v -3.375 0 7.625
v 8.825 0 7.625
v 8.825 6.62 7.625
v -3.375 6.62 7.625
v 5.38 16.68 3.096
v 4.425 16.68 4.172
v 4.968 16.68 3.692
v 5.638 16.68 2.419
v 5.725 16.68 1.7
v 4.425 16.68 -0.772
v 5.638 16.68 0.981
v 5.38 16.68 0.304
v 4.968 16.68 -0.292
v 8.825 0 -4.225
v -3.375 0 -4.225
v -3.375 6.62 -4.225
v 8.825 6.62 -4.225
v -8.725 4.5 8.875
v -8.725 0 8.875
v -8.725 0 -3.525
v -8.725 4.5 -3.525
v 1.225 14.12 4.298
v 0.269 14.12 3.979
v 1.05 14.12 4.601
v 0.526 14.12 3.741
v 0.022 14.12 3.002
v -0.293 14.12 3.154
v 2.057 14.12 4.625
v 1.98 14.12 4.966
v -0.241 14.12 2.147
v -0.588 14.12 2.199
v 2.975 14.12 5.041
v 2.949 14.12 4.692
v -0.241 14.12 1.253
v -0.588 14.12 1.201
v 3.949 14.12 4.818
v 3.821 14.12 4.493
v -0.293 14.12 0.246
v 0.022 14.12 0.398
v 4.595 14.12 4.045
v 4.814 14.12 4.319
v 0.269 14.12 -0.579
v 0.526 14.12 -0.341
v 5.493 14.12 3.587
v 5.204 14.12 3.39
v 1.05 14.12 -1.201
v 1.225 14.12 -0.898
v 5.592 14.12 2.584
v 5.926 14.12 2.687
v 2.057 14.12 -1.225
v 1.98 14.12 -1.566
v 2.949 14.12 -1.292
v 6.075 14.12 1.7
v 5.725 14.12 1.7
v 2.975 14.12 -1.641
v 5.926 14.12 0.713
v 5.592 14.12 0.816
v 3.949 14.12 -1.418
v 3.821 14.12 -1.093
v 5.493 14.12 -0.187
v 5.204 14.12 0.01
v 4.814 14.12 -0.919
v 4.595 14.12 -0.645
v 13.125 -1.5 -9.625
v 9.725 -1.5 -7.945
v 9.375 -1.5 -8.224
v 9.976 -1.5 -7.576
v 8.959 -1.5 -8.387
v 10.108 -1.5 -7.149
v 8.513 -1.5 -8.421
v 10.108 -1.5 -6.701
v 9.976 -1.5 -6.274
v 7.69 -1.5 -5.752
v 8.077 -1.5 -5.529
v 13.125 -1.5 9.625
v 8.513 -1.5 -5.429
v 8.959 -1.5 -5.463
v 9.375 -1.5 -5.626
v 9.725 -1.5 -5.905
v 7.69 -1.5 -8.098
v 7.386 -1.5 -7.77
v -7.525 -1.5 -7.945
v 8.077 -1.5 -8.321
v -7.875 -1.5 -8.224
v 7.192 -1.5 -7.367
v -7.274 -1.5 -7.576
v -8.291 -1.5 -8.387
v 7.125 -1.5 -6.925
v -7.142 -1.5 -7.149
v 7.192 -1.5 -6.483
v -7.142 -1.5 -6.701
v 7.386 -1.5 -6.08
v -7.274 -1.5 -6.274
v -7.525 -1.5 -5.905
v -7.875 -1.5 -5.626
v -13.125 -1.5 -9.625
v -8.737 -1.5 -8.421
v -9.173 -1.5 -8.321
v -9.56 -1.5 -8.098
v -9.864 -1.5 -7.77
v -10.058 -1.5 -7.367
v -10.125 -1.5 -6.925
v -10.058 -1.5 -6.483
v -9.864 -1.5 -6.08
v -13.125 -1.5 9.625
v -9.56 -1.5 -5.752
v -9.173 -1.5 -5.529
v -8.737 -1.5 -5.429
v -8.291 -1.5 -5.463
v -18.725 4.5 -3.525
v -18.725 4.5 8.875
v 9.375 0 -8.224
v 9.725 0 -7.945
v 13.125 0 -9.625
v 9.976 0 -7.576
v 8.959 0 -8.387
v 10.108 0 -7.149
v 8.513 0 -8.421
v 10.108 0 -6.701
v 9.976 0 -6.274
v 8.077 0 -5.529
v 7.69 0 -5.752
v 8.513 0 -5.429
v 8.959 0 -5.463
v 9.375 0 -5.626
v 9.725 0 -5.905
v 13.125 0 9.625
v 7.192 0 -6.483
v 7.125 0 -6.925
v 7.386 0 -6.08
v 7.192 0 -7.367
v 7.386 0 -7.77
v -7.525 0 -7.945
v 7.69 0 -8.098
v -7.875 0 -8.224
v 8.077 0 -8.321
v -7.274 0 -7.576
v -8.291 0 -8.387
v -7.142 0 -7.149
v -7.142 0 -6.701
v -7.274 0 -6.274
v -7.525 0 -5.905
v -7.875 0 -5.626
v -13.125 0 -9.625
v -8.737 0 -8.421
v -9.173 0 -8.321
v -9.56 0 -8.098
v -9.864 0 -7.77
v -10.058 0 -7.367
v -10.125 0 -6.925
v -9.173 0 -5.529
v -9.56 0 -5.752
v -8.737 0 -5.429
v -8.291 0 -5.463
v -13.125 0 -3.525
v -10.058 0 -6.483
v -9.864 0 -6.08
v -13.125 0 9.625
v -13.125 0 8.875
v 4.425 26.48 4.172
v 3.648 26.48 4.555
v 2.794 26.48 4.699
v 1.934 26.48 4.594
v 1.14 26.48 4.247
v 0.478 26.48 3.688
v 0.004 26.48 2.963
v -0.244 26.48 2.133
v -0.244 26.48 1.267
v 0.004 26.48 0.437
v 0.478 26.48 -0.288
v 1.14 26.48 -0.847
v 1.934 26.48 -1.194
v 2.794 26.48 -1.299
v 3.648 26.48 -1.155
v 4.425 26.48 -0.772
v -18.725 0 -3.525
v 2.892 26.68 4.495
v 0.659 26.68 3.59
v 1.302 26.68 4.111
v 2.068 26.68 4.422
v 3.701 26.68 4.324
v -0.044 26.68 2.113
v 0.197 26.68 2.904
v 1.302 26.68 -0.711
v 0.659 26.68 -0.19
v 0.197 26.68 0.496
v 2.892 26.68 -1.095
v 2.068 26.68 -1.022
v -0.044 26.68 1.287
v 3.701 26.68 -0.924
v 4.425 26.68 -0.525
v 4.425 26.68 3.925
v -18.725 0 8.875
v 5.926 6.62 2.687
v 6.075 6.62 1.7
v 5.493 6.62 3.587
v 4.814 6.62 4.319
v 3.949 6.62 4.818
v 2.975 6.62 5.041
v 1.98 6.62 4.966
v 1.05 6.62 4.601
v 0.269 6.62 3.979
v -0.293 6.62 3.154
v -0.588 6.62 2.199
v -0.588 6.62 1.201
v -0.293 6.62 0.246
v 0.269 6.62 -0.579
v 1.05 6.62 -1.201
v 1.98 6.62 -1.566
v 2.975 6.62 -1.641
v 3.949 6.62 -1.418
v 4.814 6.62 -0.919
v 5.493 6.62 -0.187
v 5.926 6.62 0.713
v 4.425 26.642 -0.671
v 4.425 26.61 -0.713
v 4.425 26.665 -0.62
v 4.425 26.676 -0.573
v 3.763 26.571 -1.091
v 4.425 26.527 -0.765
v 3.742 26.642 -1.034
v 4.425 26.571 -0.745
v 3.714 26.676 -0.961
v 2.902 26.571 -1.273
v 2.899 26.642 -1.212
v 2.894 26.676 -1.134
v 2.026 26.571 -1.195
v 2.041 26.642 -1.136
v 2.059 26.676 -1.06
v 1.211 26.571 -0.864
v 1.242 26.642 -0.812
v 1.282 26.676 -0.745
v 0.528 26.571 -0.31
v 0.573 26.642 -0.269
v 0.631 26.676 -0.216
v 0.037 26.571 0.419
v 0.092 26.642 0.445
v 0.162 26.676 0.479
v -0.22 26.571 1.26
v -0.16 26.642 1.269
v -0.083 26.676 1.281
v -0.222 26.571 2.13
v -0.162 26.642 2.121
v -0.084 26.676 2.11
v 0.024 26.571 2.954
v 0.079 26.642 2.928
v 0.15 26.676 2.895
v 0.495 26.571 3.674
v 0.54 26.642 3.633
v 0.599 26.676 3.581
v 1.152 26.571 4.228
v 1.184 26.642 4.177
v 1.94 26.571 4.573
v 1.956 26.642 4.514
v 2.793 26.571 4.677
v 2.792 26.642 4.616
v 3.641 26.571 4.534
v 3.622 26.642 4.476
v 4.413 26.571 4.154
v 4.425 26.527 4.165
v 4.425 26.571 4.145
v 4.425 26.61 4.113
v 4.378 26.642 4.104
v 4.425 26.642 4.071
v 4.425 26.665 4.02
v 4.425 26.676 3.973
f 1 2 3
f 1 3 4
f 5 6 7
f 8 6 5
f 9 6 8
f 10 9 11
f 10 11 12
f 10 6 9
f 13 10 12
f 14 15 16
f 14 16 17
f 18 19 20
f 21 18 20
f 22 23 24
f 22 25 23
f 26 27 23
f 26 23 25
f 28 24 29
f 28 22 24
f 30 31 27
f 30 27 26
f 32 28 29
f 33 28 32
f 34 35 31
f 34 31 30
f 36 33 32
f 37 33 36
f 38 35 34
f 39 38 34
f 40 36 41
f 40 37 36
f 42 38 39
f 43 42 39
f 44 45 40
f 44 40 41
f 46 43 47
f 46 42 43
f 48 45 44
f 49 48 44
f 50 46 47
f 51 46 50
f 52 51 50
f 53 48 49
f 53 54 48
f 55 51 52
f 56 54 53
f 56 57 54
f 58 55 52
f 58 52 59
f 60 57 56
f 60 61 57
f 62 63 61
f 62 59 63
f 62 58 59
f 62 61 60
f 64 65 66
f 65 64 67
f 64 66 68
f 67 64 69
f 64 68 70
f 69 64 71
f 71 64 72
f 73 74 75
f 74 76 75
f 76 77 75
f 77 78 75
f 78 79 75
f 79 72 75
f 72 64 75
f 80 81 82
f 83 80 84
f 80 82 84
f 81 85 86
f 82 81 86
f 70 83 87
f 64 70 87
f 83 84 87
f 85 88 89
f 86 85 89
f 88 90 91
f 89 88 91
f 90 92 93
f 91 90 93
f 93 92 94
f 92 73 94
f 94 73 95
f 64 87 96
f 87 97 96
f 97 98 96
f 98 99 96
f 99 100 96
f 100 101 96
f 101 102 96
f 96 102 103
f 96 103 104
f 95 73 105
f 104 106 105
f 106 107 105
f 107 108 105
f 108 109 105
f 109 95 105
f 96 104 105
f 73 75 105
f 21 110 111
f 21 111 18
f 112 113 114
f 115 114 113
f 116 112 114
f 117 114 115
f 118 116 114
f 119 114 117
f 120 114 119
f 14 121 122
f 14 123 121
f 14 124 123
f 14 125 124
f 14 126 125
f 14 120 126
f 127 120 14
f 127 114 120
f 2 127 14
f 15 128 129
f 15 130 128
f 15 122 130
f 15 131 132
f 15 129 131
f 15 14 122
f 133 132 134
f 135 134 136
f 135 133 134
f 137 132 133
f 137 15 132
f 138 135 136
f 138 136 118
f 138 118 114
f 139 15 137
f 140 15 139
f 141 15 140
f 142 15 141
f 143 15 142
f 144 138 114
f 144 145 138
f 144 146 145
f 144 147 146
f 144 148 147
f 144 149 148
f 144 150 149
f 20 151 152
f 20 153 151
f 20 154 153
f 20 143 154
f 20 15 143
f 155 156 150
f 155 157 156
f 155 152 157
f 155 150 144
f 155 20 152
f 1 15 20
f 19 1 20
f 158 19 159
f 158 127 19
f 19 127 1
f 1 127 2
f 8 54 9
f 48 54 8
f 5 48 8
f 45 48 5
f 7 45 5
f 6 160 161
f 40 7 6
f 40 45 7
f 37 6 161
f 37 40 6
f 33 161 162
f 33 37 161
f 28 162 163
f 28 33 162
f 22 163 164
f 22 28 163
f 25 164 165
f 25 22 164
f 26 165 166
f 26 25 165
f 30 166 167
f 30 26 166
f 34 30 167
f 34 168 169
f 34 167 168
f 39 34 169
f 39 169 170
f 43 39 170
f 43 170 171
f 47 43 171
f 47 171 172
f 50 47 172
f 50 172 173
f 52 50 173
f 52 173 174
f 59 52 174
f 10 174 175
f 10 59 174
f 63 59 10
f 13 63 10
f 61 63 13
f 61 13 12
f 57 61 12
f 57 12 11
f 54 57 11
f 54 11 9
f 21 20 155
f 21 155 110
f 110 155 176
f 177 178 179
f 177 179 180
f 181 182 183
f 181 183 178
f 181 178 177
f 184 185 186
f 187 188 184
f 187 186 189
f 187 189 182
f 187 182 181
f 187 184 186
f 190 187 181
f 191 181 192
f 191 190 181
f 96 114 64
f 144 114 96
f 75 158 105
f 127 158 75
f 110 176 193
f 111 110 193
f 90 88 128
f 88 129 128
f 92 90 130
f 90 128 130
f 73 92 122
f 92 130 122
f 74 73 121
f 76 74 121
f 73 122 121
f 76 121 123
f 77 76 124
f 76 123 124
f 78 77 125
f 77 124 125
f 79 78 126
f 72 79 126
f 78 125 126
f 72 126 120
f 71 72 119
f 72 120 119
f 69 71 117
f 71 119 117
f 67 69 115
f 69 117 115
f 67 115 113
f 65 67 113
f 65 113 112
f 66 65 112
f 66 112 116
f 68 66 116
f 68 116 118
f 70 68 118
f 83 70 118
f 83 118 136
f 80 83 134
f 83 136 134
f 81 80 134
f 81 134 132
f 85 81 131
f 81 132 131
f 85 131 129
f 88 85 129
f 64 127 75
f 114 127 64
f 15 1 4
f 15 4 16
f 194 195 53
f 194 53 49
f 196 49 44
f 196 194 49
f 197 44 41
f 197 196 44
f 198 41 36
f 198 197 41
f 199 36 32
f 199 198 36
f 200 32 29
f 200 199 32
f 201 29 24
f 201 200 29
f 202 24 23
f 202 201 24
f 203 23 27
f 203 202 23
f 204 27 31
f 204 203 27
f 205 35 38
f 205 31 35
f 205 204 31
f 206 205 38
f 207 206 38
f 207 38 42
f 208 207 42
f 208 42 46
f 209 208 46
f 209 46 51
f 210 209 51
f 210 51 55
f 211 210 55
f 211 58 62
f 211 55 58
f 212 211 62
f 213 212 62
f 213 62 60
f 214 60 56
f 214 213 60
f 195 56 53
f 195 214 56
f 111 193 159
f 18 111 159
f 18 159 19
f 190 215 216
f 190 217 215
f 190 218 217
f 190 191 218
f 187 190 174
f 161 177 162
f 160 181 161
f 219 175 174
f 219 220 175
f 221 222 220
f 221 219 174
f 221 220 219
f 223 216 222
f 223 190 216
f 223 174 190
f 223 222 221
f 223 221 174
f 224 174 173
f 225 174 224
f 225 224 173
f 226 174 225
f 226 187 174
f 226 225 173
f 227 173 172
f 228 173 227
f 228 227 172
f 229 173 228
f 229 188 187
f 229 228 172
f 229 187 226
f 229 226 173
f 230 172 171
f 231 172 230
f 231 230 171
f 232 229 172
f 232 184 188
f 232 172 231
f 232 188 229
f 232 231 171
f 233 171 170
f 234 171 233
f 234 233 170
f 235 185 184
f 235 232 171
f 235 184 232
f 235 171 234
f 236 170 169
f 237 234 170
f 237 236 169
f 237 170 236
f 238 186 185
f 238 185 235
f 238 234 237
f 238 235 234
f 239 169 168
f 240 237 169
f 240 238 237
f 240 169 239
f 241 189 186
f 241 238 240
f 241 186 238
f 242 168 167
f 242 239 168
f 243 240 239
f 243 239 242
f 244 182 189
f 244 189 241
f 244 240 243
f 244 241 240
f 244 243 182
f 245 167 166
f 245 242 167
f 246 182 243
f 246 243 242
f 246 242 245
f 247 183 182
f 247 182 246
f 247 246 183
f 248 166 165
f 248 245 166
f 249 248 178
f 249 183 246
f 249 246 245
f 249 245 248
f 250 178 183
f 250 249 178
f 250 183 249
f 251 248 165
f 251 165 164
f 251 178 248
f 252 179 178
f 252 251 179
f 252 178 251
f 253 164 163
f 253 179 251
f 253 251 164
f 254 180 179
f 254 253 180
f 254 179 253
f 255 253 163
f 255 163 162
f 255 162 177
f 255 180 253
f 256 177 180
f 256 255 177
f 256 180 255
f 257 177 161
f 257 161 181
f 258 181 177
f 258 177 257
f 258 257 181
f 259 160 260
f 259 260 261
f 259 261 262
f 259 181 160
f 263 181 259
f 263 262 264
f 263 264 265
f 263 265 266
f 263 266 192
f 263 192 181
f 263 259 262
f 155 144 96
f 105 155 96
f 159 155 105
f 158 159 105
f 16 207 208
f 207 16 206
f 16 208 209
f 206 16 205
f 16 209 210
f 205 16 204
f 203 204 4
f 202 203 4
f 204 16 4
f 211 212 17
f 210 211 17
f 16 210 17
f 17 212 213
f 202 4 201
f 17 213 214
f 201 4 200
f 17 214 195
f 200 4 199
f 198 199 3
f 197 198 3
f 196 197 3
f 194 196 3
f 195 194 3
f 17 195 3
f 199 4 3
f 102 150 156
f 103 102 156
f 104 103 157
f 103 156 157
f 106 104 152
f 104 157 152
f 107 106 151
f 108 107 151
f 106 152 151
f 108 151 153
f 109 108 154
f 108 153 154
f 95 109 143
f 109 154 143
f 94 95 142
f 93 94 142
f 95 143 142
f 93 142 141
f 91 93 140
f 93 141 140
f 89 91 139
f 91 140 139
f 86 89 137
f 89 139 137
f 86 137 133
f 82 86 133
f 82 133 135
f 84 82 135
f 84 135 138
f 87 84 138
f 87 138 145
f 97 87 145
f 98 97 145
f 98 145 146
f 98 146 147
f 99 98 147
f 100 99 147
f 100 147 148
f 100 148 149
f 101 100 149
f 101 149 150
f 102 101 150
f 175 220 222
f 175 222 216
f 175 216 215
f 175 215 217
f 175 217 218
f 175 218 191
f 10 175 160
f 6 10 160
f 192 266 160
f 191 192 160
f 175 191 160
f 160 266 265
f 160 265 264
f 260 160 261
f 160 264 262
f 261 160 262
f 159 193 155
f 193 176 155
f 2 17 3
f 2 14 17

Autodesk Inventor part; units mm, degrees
ref_plane "YZ Plane" through (0, 0, 0) normal (1, 0, 0) x (0, 1, 0)
ref_plane "XZ Plane" through (0, 0, 0) normal (0, 1, 0) x (-1, 0, 0)
ref_plane "XY Plane" through (0, 0, 0) normal (0, 0, 1) x (1, 0, 0)
sketch "Sketch1" plane through (0, 0, 0) normal (0, 1, 0) x (-1, 0, 0)
  line L0 (13.125, 9.625) -> (-13.125, 9.625)
  line L1 (-13.125, 9.625) -> (-13.125, -9.625)
  line L2 (-13.125, -9.625) -> (13.125, -9.625)
  line L3 (13.125, -9.625) -> (13.125, 9.625)
  line L4 (13.125, 9.625) -> (-13.125, -9.625) construction
  line L5 (-13.125, 9.625) -> (13.125, -9.625) construction
  circle A0 centre (8.625, -6.925) radius 1.5
  circle A1 centre (-8.625, -6.925) radius 1.5
  line L6 (3.375, 7.625) -> (-8.825, 7.625)
  line L7 (-8.825, 7.625) -> (-8.825, -4.225)
  line L8 (-8.825, -4.225) -> (3.375, -4.225)
  line L9 (3.375, -4.225) -> (3.375, 7.625)
  line L10 (3.375, 7.625) -> (-8.825, -4.225) construction
  line L11 (-8.825, 7.625) -> (3.375, -4.225) construction
  point P0 (0, 0)
  point P1 (-2.725, 1.7)
  dimension "d0" = 26.25
  dimension "d1" = 19.25
  dimension "d2" = 3
  dimension "d3" = 3
  dimension "d5" = 2.7
  dimension "d8" = 4.5
  dimension "d9" = 4.5
  dimension "d11" = 2.7
  dimension "d12" = 12.2
  dimension "d13" = 11.85
  dimension "d14" = 2
  dimension "d15" = 4.3
extrude "Extrusion1" add sketch "Sketch1" against normal blind 1.5
sketch "Sketch2" plane through (0, -1.5, 0) normal (0, -1, 0) x (1, 0, 0)
  line L0 (8.825, -4.225) -> (8.825, 7.625) projected
  line L1 (8.825, 7.625) -> (-3.375, 7.625) projected
  line L2 (-3.375, 7.625) -> (-3.375, -4.225) projected
  line L3 (-3.375, -4.225) -> (8.825, -4.225) projected
  circle A0 centre (8.625, -6.925) radius 1.5 projected
  circle A1 centre (-8.625, -6.925) radius 1.5 projected
  line L4 (-13.125, 9.625) -> (13.125, 9.625) projected
  line L5 (13.125, 9.625) -> (13.125, -9.625) projected
  line L6 (13.125, -9.625) -> (-13.125, -9.625) projected
  line L7 (-13.125, -9.625) -> (-13.125, 9.625) projected
  point P0 (0, 0)
extrude "Extrusion2" add sketch "Sketch2" against normal blind 8.12 contours L3 L2 L1 L0
sketch "Sketch3" plane through (0, 0, 0) normal (0, 1, 0) x (1, 0, 0)
  line L0 (-18.725, -8.875) -> (-8.725, -8.875)
  line L1 (-8.725, -8.875) -> (-8.725, 3.525)
  line L2 (-8.725, 3.525) -> (-18.725, 3.525)
  line L3 (-18.725, 3.525) -> (-18.725, -8.875)
  line L4 (-18.725, -8.875) -> (-8.725, 3.525) construction
  line L5 (-8.725, -8.875) -> (-18.725, 3.525) construction
  line L6 (-13.125, 9.625) -> (-13.125, -9.625) projected
  line L7 (13.125, 9.625) -> (-13.125, 9.625) projected
  point P0 (0, 0)
  point P1 (-13.725, -2.675)
  dimension "d20" = 10
  dimension "d21" = 12.4
  dimension "d22" = 4.4
  dimension "d23" = 18.5
extrude "Extrusion3" add sketch "Sketch3" along normal blind 4.5
sketch "Sketch4" plane through (0, 6.62, 0) normal (0, 1, 0) x (1, 0, 0)
  line L0 (8.825, -7.625) -> (8.825, 4.225) projected
  line L1 (8.825, 4.225) -> (-3.375, 4.225) projected
  line L2 (-3.375, 4.225) -> (-3.375, -7.625) projected
  line L3 (-3.375, -7.625) -> (8.825, -7.625) projected
  circle A0 centre (2.725, -1.7) radius 3.35
  point P0 (0, 0)
  dimension "d26" = 6.7
extrude "Extrusion4" add sketch "Sketch4" along normal blind 7.5 contours A0
sketch "Sketch5" plane through (2.725, 14.12, 1.7) normal (0, 1, 0) x (1, 0, 0)
  circle A0 centre (0, 0) radius 3.35 projected
  circle A1 centre (0, 0) radius 3
  point P0 (-2.725, 1.7)
  dimension "d29" = 6
extrude "Extrusion5" add sketch "Sketch5" along normal blind 12.56 contours A1
sketch "Sketch6" plane through (2.725, 26.68, 1.7) normal (0, 1, 0) x (1, 0, 0)
  circle A0 centre (0, 0) radius 3 projected
  line L0 (1.7, 2.4718) -> (1.7, -2.4718)
  point P0 (-2.725, 1.7)
  dimension "d32" = 1.7
extrude "Extrusion6" cut sketch "Sketch6" against normal blind 10 contours A0 L0 picked at (2.1333, 0)
fillet "Fillet1" radius 0.2 1 edges at (-0.275, 26.68, 1.7)
equation "\"d11\" = d5"
properties part number "encoder"
